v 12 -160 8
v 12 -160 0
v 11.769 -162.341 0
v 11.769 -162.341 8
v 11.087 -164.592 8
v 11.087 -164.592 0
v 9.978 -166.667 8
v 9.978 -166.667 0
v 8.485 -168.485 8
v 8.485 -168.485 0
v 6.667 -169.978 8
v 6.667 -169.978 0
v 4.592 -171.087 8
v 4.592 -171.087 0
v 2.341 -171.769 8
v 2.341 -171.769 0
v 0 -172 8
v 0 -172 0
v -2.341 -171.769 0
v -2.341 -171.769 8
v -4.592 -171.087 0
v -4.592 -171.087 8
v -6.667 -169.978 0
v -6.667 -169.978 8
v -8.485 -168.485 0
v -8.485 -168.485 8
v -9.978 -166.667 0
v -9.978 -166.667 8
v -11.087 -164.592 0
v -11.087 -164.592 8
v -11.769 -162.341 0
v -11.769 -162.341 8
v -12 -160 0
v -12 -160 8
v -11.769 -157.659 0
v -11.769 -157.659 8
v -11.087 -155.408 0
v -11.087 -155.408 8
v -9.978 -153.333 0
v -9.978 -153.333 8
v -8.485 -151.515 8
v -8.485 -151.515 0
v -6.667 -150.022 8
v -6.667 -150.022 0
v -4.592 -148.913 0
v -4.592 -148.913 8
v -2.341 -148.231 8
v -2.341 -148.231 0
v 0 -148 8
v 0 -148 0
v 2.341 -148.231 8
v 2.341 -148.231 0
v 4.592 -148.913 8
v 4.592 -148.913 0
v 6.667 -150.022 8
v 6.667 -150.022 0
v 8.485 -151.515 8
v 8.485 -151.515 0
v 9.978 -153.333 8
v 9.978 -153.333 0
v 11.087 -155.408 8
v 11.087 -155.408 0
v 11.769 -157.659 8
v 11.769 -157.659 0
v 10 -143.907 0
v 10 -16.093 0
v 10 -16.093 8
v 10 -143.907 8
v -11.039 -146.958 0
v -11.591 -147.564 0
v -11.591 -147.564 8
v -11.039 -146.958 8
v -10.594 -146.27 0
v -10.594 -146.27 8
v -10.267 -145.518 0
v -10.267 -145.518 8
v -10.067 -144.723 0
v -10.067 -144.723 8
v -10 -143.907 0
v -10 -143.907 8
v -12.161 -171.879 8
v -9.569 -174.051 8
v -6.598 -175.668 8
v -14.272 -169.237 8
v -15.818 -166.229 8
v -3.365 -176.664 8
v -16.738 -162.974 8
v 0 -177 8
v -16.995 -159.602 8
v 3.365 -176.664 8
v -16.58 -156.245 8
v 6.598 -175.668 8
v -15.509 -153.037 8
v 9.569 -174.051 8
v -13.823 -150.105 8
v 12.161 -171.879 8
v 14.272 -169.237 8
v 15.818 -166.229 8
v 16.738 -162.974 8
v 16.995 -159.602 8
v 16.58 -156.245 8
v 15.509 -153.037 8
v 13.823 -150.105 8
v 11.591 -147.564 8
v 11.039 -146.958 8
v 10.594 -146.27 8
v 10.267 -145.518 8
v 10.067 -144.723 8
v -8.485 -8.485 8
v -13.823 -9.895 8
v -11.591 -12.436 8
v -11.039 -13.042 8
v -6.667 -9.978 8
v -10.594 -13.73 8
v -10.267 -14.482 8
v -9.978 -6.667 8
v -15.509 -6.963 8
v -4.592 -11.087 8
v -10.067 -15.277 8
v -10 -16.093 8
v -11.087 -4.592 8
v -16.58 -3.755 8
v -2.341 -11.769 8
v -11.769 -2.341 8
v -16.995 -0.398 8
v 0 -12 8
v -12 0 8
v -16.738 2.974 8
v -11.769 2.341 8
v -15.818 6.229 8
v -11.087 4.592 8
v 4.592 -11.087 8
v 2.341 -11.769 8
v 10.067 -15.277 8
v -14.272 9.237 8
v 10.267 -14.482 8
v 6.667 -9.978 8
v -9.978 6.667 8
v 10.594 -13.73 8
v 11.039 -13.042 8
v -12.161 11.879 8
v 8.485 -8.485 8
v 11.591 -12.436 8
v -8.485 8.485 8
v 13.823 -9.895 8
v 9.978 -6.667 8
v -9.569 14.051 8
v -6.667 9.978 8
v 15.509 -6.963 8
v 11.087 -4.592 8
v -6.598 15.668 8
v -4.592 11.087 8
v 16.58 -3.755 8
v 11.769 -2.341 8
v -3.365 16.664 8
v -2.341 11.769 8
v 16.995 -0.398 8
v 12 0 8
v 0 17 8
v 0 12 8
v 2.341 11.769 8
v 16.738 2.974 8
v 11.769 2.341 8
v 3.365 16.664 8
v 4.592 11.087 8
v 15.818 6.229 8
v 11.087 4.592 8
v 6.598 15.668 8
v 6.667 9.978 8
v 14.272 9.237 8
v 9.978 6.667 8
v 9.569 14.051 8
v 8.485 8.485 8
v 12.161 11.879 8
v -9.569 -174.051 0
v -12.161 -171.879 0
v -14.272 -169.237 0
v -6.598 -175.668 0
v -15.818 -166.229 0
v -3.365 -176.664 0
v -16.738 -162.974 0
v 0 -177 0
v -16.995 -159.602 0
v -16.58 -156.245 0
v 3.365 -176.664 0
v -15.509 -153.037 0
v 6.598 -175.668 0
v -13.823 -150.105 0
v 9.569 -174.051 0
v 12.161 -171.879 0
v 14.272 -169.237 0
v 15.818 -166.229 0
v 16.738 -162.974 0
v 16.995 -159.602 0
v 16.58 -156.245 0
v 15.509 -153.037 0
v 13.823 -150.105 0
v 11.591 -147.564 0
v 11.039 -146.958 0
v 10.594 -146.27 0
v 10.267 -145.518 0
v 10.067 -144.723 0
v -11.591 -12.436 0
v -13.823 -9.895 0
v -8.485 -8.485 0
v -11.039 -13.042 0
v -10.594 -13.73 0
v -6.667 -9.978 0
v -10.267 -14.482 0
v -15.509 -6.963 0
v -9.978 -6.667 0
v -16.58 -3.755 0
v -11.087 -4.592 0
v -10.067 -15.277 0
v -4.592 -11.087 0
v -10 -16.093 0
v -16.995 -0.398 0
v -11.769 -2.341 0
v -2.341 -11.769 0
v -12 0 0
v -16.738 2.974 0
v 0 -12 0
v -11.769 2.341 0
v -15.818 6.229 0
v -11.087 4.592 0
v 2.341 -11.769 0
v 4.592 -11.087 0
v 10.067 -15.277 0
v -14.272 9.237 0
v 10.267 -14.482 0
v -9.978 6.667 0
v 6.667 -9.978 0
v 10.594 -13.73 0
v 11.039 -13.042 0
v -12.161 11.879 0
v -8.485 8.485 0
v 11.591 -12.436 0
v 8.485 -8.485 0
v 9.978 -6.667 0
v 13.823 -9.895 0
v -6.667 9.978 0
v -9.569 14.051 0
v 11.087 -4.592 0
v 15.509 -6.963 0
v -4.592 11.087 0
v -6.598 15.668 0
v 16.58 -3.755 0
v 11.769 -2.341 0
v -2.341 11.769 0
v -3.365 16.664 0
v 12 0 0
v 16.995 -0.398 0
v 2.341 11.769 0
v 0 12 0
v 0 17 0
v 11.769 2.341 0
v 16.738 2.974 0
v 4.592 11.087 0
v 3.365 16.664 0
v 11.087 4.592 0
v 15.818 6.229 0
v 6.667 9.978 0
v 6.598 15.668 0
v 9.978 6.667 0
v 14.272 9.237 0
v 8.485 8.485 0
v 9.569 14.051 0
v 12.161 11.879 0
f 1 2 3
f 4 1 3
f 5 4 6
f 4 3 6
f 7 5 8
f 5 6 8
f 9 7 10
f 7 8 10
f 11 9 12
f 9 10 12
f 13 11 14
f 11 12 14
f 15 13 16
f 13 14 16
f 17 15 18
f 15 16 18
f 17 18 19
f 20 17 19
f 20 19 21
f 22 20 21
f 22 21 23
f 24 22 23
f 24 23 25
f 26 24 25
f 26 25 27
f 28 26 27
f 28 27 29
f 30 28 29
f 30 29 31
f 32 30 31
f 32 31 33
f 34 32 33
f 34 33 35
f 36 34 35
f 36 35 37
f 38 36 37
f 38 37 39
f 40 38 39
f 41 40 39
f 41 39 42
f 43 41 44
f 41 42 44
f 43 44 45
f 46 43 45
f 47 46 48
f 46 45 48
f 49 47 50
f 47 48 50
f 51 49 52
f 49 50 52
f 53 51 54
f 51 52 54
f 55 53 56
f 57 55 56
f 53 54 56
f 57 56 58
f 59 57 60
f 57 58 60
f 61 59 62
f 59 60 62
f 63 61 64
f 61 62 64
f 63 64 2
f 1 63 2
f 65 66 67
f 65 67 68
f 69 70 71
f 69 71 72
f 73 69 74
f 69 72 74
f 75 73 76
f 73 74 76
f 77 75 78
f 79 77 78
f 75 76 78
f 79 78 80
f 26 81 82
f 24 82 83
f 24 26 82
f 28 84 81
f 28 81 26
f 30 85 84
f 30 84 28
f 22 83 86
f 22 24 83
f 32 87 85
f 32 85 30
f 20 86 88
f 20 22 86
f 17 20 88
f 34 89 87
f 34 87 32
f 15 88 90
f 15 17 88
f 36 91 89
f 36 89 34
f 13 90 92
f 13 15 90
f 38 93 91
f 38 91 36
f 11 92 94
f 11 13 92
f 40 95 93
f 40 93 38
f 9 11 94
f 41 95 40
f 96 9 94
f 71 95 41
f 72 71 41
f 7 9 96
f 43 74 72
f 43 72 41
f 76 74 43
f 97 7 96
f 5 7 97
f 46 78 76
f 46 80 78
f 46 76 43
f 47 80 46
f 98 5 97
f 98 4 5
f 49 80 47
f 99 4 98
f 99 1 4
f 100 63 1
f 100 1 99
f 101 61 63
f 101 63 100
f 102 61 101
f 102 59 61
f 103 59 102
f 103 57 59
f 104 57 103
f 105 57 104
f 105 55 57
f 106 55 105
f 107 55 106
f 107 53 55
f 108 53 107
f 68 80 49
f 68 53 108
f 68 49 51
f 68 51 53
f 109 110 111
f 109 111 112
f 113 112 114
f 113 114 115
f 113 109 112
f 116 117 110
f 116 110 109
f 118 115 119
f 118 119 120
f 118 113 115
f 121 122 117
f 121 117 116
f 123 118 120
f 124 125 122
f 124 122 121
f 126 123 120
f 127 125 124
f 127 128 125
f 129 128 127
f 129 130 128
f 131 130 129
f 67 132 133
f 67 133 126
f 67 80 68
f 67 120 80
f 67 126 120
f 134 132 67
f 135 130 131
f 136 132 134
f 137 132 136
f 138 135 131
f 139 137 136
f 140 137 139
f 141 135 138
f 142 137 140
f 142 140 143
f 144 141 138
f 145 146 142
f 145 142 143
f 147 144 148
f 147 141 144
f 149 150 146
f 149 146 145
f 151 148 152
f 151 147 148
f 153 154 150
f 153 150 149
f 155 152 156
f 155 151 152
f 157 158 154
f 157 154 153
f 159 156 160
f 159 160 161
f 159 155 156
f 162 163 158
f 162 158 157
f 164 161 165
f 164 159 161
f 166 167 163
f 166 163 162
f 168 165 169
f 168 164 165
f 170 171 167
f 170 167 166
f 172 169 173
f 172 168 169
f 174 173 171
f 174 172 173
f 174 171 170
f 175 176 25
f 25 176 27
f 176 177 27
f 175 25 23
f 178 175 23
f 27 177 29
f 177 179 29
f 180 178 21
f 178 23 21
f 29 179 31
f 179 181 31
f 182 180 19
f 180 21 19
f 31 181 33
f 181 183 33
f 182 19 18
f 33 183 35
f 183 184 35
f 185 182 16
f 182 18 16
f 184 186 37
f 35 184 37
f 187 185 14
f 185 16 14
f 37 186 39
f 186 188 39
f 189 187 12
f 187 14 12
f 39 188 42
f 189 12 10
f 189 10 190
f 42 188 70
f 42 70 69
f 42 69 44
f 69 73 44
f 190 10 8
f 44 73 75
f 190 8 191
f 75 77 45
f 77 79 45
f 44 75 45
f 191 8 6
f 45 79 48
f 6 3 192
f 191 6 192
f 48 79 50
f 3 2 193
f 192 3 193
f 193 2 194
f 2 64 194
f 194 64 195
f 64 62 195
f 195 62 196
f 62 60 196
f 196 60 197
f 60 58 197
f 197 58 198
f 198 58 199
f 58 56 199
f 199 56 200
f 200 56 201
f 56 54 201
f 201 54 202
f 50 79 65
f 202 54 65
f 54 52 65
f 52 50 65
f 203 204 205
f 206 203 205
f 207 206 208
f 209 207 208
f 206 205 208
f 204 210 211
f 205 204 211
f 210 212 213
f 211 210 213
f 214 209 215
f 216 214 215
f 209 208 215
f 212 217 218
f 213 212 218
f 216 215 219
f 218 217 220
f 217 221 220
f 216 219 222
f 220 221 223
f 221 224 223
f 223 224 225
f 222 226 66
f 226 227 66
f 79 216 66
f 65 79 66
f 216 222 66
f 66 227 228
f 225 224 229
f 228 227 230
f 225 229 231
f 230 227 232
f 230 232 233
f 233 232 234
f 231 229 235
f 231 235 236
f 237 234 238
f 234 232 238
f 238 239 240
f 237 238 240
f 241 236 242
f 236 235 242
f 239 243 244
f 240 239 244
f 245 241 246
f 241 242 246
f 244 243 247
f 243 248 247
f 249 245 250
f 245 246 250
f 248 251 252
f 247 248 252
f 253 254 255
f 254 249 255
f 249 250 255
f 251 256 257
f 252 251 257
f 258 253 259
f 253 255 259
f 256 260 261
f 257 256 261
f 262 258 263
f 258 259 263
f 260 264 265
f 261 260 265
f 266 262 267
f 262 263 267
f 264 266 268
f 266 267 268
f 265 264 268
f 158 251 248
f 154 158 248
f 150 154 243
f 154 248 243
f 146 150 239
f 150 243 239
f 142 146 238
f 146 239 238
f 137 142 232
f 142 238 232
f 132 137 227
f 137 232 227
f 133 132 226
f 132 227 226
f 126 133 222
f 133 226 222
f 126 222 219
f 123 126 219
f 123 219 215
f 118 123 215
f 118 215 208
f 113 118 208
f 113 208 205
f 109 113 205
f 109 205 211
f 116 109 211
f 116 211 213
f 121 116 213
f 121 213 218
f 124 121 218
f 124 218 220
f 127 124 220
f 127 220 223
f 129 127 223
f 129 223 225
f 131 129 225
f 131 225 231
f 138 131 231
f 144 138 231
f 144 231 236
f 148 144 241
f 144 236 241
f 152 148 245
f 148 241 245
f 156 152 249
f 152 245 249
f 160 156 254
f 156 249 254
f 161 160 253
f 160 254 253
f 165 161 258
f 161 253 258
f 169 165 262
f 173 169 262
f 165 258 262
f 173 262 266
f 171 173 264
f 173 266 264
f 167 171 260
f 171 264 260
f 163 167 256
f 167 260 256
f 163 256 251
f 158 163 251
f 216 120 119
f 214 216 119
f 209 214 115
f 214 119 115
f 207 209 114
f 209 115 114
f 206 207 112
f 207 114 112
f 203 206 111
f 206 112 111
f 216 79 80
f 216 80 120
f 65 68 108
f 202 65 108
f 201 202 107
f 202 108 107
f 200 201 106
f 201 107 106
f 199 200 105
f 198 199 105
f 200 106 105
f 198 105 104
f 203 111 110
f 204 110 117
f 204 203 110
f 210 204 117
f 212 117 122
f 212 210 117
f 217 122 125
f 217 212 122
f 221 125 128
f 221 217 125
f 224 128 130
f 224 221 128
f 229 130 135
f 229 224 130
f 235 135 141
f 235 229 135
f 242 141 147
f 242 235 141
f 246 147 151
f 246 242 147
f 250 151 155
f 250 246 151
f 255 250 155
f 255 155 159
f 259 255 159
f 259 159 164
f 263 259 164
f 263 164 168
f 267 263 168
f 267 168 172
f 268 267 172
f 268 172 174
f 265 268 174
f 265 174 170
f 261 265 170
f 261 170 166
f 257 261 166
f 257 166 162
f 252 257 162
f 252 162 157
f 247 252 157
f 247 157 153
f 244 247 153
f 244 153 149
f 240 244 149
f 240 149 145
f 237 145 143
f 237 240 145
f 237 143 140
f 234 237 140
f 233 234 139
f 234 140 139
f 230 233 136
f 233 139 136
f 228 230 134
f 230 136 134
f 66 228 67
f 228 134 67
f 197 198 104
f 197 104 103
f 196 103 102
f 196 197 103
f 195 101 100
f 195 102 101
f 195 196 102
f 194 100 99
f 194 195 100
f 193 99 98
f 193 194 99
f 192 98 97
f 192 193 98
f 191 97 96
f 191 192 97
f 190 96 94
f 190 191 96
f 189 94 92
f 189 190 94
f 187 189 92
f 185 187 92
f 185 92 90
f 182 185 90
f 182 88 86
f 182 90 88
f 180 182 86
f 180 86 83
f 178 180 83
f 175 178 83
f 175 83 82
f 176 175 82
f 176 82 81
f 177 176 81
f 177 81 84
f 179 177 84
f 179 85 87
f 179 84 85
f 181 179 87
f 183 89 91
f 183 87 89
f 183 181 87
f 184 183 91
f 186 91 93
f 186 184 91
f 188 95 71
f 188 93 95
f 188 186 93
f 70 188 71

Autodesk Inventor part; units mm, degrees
ref_plane "YZ Plane" through (0, 0, 0) normal (1, 0, 0) x (0, 1, 0)
ref_plane "XZ Plane" through (0, 0, 0) normal (0, 1, 0) x (-1, 0, 0)
ref_plane "XY Plane" through (0, 0, 0) normal (0, 0, 1) x (1, 0, 0)
sketch "スケッチ1" plane through (0, 0, 0) normal (0, 0, 1) x (1, 0, 0)
  circle A0 centre (0, 0) radius 17
  circle A1 centre (0, 0) radius 12
  circle A2 centre (0, -160) radius 12
  line L0 (-12, 0) -> (10.75, 0)
  line L1 (12, -160) -> (11, -160)
  circle A3 centre (0, -160) radius 17
  line L2 (-10, 24.6876) -> (10, 24.6876)
  line L3 (10, 24.6876) -> (10, -208.9864)
  line L4 (10, -208.9864) -> (-10, -208.9864)
  line L5 (-10, -208.9864) -> (-10, 24.6876)
  point P0 (-8, 8.9443)
  point P1 (12, 0)
  point P2 (0, -167.6676)
  point P3 (9.375, -145.8187)
  point P4 (-10.625, -146.7294)
  point P5 (-10.625, -13.2706)
  point P6 (9.375, -14.1813)
  point P7 (-0.625, 0)
  point P8 (-10, -13.7477)
  point P9 (-10, -146.2523)
  point P10 (10, -146.2523)
  point P11 (10, -13.7477)
  point P12 (10, -173.7477)
  point P13 (-10, -173.7477)
  point P14 (-10, 13.7477)
  point P15 (10, 13.7477)
  point P16 (-10, 6.6332)
  point P17 (-10, 0)
  point P18 (10, 0)
  point P19 (10, 6.6332)
  point P20 (-10, -6.6332)
  point P21 (10, -6.6332)
  point P22 (-10, -153.3668)
  point P23 (-10, -166.6332)
  point P24 (10, -166.6332)
  point P25 (10, -153.3668)
  dimension "d17" = 24
  dimension "d0" = 34
  dimension "d1" = 24
  dimension "d22" = 160
  dimension "d24" = 0
  dimension "d27" = 34
  dimension "d31" = 10
  dimension "d32" = 20
extrude "押し出し1" add sketch "スケッチ1" along normal blind 8 contours A0 L3 A1 | L3 A1 L5 A0 | L3 A3 L5 A0 | A0 L5 A1 L3 | L5 A1 A0 | L3 A2 L5 A3 | A3 L3 A2 | L5 A2 A3 | L5 A2 L3 A3
fillet "フィレット2" radius 5 4 edges at (-10, -146.2523, 4) (10, -146.2523, 4) (10, -13.7477, 4) (-10, -13.7477, 4)
equation "\"d17\" = d1"
equation "\"d31\" = 0.5 * d32"
equation "\"d23\" = 0.5 * d3"
equation "\"d3\" = 10"
properties part number "RP_Thigh-Link" material "アルミニウム7075"
